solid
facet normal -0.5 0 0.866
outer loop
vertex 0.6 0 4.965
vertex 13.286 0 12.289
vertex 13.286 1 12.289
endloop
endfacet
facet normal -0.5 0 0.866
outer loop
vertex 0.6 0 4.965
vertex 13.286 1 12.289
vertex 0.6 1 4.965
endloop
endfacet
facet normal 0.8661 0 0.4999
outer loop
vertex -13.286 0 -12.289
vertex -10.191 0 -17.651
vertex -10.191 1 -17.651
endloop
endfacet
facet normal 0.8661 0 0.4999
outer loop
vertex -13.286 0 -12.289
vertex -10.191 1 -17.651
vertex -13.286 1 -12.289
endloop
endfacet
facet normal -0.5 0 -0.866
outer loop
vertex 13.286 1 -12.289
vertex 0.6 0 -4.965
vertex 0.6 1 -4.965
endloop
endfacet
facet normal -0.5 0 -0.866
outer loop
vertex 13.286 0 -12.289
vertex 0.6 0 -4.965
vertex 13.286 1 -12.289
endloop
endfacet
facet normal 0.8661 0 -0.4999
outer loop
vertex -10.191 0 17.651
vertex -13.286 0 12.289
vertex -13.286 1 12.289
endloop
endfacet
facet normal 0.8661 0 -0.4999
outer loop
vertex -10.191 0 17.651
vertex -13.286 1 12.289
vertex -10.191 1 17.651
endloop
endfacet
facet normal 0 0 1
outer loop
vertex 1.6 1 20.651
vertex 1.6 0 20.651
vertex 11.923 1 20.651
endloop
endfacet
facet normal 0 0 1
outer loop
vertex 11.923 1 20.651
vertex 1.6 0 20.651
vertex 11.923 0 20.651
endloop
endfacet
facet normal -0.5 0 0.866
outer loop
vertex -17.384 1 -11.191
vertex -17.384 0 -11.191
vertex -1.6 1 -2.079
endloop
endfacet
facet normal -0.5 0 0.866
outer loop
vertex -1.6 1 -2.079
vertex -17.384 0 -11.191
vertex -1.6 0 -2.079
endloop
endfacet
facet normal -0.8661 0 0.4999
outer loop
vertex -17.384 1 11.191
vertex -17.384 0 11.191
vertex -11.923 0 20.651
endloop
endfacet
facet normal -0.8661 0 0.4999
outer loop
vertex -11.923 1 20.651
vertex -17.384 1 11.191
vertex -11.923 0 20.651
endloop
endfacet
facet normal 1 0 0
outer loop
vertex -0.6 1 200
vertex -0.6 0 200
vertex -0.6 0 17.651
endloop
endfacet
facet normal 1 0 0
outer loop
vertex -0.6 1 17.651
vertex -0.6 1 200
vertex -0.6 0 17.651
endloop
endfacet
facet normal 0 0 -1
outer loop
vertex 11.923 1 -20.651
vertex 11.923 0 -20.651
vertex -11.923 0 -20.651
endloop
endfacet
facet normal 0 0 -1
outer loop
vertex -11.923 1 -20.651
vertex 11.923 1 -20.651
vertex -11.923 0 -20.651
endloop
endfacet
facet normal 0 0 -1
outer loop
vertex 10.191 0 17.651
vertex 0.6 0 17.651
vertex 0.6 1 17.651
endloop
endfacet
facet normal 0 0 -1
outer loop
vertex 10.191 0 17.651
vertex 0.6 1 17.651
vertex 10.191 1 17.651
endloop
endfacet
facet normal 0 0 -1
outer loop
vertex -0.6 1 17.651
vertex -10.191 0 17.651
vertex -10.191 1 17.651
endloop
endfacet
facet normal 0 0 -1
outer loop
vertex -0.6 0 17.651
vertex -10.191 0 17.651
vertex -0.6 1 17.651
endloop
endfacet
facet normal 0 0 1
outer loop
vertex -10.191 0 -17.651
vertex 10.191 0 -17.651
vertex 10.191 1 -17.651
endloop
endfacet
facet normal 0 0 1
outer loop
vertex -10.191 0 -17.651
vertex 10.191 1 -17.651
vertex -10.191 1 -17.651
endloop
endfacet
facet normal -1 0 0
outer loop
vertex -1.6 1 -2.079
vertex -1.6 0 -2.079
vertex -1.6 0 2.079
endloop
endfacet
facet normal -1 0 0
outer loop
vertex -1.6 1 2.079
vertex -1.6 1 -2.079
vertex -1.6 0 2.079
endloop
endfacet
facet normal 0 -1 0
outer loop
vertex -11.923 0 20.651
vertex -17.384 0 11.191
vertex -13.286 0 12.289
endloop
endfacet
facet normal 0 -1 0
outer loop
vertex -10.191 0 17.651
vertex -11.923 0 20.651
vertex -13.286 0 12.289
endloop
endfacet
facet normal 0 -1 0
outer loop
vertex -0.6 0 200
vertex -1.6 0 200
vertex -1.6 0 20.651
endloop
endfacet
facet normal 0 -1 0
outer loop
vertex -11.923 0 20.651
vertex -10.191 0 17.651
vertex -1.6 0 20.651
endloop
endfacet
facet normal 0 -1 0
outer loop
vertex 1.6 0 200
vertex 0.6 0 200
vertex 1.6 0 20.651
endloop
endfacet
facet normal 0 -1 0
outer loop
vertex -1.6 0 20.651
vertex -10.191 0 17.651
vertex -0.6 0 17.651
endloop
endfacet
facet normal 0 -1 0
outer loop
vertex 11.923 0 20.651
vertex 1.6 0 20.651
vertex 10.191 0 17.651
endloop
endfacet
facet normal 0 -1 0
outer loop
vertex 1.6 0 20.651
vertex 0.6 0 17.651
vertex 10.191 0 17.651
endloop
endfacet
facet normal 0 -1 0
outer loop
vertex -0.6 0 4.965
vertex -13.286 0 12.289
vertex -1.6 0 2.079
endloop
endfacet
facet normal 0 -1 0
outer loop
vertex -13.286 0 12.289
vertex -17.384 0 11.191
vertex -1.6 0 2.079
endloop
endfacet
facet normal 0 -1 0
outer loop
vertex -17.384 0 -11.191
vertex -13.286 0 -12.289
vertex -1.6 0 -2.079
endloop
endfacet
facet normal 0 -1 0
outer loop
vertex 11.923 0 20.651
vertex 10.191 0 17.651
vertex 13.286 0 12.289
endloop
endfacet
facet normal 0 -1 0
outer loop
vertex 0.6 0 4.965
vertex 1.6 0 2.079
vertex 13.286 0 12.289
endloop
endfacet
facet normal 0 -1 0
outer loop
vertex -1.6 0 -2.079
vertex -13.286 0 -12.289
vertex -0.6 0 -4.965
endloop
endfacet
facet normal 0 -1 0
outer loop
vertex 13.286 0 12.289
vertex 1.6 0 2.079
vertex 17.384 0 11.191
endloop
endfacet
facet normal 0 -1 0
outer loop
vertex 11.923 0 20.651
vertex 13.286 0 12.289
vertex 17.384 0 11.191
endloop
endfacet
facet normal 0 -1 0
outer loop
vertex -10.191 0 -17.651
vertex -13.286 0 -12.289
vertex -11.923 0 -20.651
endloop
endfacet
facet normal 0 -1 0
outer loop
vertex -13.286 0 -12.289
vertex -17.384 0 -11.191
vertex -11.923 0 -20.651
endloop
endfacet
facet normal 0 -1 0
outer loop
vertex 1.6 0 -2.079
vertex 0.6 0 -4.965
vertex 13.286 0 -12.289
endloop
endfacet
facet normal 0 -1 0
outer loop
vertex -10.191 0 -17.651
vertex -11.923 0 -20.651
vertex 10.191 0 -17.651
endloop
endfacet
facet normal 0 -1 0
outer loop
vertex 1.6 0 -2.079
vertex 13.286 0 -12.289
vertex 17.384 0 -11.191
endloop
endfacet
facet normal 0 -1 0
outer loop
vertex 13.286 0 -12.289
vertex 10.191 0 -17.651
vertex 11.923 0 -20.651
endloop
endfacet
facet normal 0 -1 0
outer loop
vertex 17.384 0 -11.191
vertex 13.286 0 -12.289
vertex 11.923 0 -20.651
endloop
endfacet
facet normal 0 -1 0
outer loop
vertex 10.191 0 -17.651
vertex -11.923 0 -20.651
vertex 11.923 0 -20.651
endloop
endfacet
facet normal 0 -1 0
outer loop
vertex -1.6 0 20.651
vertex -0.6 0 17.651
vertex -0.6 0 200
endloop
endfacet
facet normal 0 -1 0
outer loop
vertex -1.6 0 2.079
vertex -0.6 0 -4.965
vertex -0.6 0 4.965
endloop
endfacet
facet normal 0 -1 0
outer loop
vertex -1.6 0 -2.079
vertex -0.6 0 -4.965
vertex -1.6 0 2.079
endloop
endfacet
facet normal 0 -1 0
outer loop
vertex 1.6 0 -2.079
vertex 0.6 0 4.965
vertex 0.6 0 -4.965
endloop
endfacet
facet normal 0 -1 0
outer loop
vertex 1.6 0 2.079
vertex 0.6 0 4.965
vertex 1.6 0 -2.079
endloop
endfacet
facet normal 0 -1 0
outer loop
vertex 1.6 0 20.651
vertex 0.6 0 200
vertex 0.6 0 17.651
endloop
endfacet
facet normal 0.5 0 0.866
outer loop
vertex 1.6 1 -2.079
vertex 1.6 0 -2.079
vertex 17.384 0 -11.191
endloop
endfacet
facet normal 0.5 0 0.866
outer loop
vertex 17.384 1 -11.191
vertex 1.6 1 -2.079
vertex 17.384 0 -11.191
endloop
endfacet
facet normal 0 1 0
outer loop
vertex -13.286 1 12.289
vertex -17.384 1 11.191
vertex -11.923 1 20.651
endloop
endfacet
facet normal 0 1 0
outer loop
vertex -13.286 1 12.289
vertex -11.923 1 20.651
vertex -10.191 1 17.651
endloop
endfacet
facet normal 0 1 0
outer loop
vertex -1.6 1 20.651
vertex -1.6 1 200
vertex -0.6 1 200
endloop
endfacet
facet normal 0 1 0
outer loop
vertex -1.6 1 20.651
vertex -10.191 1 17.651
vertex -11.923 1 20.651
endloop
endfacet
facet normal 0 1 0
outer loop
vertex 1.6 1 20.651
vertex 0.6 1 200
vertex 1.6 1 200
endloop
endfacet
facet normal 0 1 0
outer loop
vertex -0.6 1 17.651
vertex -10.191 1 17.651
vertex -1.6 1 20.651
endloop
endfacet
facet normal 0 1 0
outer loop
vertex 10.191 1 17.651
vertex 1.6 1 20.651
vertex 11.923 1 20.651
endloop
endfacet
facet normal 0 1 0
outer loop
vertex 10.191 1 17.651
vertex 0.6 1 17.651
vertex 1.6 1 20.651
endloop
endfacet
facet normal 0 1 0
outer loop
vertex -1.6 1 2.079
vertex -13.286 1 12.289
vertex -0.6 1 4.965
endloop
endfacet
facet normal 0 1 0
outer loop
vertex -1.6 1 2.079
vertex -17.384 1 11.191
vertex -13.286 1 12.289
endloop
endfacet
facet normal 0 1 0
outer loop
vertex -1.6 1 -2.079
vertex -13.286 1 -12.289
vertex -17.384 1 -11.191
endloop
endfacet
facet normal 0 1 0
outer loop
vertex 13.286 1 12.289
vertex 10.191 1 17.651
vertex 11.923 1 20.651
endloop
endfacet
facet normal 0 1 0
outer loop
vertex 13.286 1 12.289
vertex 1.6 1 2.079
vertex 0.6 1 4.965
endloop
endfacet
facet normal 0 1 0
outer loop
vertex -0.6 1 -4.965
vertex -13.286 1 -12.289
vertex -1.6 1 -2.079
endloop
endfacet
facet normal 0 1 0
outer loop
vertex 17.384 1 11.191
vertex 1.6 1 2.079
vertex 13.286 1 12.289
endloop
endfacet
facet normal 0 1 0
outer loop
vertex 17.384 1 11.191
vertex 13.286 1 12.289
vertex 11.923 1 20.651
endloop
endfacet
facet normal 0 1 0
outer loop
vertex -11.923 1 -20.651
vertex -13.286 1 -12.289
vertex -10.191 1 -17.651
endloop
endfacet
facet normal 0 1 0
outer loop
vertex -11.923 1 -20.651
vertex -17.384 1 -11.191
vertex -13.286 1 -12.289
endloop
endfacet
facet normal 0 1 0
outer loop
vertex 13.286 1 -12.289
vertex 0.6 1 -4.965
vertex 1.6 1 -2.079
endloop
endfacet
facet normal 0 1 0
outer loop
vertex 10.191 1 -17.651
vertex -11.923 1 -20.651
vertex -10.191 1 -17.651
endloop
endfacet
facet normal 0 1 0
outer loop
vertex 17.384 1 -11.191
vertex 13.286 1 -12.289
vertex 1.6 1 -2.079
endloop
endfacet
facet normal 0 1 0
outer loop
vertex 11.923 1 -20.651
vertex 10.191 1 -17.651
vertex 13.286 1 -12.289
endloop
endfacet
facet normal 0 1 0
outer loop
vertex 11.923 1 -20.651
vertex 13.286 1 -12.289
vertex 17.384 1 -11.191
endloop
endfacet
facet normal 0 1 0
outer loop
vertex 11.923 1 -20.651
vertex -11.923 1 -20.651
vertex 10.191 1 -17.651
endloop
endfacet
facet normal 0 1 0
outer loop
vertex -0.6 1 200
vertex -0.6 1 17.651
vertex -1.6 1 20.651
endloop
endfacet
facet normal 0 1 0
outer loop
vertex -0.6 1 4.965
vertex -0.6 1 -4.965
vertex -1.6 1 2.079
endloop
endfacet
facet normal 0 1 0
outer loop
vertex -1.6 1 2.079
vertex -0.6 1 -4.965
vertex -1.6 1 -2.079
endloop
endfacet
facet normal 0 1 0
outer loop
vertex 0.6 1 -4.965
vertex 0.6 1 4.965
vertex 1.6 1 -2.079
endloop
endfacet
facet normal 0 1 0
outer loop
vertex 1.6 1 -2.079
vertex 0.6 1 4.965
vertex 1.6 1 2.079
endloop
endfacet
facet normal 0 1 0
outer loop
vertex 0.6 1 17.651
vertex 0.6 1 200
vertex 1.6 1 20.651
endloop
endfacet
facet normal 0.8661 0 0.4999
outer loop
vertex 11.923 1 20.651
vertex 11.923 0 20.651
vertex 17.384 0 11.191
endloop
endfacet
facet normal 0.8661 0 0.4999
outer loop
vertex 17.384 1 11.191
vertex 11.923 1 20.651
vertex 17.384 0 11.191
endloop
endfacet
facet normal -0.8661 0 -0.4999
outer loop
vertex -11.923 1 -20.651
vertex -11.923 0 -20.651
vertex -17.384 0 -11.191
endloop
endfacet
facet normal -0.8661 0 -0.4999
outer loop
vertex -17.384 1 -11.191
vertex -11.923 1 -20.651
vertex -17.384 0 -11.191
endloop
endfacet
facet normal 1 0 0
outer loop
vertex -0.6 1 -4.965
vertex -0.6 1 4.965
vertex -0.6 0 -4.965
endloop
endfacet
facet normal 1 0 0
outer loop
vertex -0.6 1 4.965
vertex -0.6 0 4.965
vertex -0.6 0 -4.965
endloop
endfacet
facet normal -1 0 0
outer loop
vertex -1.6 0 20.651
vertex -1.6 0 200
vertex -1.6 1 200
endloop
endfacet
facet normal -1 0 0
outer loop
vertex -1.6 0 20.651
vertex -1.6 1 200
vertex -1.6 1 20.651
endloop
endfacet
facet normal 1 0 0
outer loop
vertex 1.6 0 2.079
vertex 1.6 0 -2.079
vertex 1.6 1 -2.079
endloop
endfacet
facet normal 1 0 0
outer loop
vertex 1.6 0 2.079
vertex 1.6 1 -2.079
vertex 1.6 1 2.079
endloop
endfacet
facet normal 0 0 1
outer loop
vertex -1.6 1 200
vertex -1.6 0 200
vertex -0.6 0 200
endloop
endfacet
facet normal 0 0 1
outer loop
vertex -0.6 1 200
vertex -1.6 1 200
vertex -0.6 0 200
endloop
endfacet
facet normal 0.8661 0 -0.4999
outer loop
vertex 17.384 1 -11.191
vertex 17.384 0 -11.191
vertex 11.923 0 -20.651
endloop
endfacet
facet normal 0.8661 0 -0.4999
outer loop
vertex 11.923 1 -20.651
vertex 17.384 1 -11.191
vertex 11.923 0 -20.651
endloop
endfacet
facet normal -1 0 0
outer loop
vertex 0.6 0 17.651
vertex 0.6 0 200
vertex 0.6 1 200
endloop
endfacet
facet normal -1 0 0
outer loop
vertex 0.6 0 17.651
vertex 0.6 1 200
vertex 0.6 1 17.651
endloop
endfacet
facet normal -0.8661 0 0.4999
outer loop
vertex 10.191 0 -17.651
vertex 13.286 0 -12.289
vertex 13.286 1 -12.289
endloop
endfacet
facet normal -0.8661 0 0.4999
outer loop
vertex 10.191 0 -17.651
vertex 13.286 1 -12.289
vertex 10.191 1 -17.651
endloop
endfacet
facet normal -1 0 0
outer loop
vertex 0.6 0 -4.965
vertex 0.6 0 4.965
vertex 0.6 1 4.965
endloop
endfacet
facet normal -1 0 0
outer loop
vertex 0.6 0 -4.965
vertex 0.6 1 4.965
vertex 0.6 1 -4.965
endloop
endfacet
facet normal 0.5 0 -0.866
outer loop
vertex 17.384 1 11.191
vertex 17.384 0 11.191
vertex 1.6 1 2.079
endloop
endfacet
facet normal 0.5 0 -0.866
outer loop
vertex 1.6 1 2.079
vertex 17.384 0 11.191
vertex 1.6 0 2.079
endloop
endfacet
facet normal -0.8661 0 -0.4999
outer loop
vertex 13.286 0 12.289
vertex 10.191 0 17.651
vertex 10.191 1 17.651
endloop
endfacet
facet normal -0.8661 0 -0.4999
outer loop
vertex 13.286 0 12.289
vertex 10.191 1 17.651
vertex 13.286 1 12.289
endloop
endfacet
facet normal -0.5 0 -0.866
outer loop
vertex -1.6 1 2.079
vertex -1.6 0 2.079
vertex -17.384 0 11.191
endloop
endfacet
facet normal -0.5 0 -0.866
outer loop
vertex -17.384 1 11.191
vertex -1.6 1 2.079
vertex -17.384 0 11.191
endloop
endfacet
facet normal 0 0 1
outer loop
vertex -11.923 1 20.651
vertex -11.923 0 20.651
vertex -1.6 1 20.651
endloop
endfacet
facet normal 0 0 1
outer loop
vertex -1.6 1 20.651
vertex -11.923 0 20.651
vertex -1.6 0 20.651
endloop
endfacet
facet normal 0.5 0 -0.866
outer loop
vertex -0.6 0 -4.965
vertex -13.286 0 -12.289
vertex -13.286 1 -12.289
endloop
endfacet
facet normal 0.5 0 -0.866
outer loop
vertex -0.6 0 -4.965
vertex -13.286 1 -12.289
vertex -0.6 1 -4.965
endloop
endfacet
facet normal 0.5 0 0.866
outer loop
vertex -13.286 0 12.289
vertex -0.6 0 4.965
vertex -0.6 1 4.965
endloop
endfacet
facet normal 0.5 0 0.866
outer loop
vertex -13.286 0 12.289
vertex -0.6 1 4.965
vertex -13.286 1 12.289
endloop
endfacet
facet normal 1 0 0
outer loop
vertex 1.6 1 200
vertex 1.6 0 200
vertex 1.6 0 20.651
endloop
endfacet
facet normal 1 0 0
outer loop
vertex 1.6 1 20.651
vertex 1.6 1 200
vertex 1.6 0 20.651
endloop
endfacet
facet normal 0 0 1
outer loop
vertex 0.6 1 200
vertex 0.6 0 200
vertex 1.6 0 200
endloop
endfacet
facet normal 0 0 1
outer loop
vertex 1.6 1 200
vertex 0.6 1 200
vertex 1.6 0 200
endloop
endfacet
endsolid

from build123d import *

# Parameters (mm, degrees)
EXTRUDE_1_DEPTH          = 1
EXTRUDE_1_2_DEPTH        = 1
CUT_EXTRUDE_1_DEPTH      = 2
CUT_EXTRUDE_1_DEPTH_BACK = 2
SKETCH_2_W               = 1.200484238
SKETCH_2_H               = 35
SKETCH_3_W               = 1
SKETCH_3_H               = 179.349364905
EXTRUDE_2_DEPTH          = 1


with BuildPart() as part:
    # 草图1 → 凸台-拉伸1 (new body)
    with BuildSketch(Plane(origin=(0, 0, 0), x_dir=(1, 0, 0), z_dir=(0, 1, 0))):
        Polygon((11.922649731, 20.650635095), (-11.922649731, 20.650635095), (-17.383974596, 11.191342951), (0, 1.154700538), (17.383974596, 11.191342951), align=None)
        Polygon((10.190598923, 17.650635095), (-10.190598923, 17.650635095), (-13.285898385, 12.289419162), (0, 4.618802154), (13.285898385, 12.289419162), align=None, mode=Mode.SUBTRACT)
    extrude(amount=EXTRUDE_1_DEPTH)


with BuildPart() as body_2:
    # 草图1 → Extrude 1 2 (new body)
    with BuildSketch(Plane(origin=(0, 0, 0), x_dir=(1, 0, 0), z_dir=(0, 1, 0))):
        Polygon((0, -1.154700538), (-17.383974596, -11.191342951), (-11.922649731, -20.650635095), (11.922649731, -20.650635095), (17.383974596, -11.191342951), align=None)
        Polygon((0, -4.618802154), (-13.285898385, -12.289419162), (-10.190598923, -17.650635095), (10.190598923, -17.650635095), (13.285898385, -12.289419162), align=None, mode=Mode.SUBTRACT)
    extrude(amount=EXTRUDE_1_2_DEPTH)


with BuildPart() as cut_extrude_1_tool:
    # 草图2 → 切除-拉伸1 (new, two sides: drawn at the far end of the back side and taken through both)
    with BuildSketch(Plane(origin=(0, 0, 0), x_dir=(1, 0, 0), z_dir=(0, 1, 0)).offset(-CUT_EXTRUDE_1_DEPTH_BACK)):
        with Locations((0, -4.618802154)):
            Rectangle(SKETCH_2_W, SKETCH_2_H)
    extrude(amount=CUT_EXTRUDE_1_DEPTH + CUT_EXTRUDE_1_DEPTH_BACK)


with BuildPart() as part_1:
    add(part.part)

    # 切除-拉伸1: cut by cut_extrude_1_tool
    add(cut_extrude_1_tool.part, mode=Mode.SUBTRACT)



with BuildPart() as body_2_1:
    add(body_2.part)

    # 切除-拉伸1: cut by cut_extrude_1_tool
    add(cut_extrude_1_tool.part, mode=Mode.SUBTRACT)


with BuildPart() as part_2:
    add(part_1.part)

    add(body_2_1.part)  # 凸台-拉伸2 merges body 2
    # 草图3 → 凸台-拉伸2 (add)
    with BuildSketch(Plane(origin=(0, 0, 0), x_dir=(1, 0, 0), z_dir=(0, 1, 0))):
        with Locations((-1.100242119, -110.325317548)):
            Rectangle(SKETCH_3_W, SKETCH_3_H)
        with Locations((1.100242119, -110.325317548)):
            Rectangle(SKETCH_3_W, SKETCH_3_H)
        Polygon((-0.600242119, -1.501250487), (-0.600242119, 1.501250487), (-1.600242119, 2.078600756), (-1.600242119, -2.078600756), align=None)
        Polygon((0.600242119, -1.501250487), (0.600242119, 1.501250487), (1.600242119, 2.078600756), (1.600242119, -2.078600756), align=None)
    extrude(amount=EXTRUDE_2_DEPTH)


solid = part_2.part
